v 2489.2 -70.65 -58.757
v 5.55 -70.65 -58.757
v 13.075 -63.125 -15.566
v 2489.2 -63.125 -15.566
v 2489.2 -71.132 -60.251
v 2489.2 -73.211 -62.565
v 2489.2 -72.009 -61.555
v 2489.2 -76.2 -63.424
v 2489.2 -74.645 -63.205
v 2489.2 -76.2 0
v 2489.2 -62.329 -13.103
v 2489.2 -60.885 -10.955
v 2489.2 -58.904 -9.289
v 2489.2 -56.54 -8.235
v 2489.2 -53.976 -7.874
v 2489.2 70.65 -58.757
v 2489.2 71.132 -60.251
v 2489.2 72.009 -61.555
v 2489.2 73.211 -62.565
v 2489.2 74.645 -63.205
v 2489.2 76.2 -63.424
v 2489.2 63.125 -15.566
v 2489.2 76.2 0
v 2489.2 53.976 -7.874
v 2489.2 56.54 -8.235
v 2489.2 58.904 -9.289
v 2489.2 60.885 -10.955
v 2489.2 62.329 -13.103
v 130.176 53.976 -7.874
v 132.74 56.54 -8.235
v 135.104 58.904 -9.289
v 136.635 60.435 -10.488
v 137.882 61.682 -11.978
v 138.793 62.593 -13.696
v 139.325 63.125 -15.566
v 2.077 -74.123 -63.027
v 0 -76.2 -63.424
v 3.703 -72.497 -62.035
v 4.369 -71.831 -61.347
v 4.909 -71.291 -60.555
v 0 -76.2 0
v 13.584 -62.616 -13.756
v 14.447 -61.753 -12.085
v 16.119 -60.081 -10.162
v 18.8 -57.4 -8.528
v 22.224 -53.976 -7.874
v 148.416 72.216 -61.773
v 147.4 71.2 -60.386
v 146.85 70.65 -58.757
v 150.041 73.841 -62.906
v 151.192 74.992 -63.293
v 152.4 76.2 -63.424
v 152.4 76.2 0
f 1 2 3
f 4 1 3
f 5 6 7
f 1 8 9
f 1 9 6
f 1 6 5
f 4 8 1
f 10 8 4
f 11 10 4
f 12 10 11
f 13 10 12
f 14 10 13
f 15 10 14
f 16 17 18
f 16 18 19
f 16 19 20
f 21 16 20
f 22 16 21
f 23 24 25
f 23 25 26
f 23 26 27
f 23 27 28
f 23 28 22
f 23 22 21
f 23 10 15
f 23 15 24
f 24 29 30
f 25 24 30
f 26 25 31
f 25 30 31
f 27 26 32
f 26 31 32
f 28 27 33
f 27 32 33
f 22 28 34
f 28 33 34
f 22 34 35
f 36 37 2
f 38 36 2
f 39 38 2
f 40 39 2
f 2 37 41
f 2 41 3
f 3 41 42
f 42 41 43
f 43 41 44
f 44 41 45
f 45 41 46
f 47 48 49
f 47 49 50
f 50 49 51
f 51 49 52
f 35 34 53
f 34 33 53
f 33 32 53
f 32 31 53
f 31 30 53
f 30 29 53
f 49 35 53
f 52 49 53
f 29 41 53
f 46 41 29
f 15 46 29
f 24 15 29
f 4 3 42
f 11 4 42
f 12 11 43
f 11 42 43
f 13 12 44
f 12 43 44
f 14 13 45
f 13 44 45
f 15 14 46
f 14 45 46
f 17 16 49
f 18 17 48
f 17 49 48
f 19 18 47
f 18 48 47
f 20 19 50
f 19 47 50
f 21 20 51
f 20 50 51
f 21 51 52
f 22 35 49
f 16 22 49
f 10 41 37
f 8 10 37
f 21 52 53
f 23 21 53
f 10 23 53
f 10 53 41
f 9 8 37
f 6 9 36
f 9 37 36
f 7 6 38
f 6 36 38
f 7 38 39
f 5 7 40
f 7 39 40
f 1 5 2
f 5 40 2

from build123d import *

# Parameters (mm, degrees)
F1_DEPTH = 2489.2
F3_DEPTH = 63.4248


with BuildPart() as f1:
    # F0 (on Right) → F1 (new body)
    with BuildSketch(Plane.YZ):
        with BuildLine():
            Line((76.2, 0), (-76.2, 0))
            Line((-76.2, 0), (-76.2, -63.4238))
            ThreePointArc((-76.2, -63.4238), (-72.574321, -62.102069), (-70.649887, -58.757061))
            Line((-70.649887, -58.757061), (-63.124886, -15.566335))
            ThreePointArc((-63.124886, -15.566335), (-59.952782, -10.052651), (-53.976459, -7.874))
            Line((-53.976459, -7.874), (53.976459, -7.874))
            ThreePointArc((53.976459, -7.874), (59.952782, -10.052651), (63.124886, -15.566335))
            Line((63.124886, -15.566335), (70.649887, -58.757061))
            ThreePointArc((70.649887, -58.757061), (72.574321, -62.102069), (76.2, -63.4238))
            Line((76.2, -63.4238), (76.2, 0))
        make_face()
    extrude(amount=F1_DEPTH)

    # F2 (on face) → F3 (cut, through all)
    with BuildSketch(Plane.XY):
        Polygon((0, 76.2), (0, -76.2), (152.4, 76.2), align=None)
    extrude(amount=-F3_DEPTH, mode=Mode.SUBTRACT)


solid = f1.part
